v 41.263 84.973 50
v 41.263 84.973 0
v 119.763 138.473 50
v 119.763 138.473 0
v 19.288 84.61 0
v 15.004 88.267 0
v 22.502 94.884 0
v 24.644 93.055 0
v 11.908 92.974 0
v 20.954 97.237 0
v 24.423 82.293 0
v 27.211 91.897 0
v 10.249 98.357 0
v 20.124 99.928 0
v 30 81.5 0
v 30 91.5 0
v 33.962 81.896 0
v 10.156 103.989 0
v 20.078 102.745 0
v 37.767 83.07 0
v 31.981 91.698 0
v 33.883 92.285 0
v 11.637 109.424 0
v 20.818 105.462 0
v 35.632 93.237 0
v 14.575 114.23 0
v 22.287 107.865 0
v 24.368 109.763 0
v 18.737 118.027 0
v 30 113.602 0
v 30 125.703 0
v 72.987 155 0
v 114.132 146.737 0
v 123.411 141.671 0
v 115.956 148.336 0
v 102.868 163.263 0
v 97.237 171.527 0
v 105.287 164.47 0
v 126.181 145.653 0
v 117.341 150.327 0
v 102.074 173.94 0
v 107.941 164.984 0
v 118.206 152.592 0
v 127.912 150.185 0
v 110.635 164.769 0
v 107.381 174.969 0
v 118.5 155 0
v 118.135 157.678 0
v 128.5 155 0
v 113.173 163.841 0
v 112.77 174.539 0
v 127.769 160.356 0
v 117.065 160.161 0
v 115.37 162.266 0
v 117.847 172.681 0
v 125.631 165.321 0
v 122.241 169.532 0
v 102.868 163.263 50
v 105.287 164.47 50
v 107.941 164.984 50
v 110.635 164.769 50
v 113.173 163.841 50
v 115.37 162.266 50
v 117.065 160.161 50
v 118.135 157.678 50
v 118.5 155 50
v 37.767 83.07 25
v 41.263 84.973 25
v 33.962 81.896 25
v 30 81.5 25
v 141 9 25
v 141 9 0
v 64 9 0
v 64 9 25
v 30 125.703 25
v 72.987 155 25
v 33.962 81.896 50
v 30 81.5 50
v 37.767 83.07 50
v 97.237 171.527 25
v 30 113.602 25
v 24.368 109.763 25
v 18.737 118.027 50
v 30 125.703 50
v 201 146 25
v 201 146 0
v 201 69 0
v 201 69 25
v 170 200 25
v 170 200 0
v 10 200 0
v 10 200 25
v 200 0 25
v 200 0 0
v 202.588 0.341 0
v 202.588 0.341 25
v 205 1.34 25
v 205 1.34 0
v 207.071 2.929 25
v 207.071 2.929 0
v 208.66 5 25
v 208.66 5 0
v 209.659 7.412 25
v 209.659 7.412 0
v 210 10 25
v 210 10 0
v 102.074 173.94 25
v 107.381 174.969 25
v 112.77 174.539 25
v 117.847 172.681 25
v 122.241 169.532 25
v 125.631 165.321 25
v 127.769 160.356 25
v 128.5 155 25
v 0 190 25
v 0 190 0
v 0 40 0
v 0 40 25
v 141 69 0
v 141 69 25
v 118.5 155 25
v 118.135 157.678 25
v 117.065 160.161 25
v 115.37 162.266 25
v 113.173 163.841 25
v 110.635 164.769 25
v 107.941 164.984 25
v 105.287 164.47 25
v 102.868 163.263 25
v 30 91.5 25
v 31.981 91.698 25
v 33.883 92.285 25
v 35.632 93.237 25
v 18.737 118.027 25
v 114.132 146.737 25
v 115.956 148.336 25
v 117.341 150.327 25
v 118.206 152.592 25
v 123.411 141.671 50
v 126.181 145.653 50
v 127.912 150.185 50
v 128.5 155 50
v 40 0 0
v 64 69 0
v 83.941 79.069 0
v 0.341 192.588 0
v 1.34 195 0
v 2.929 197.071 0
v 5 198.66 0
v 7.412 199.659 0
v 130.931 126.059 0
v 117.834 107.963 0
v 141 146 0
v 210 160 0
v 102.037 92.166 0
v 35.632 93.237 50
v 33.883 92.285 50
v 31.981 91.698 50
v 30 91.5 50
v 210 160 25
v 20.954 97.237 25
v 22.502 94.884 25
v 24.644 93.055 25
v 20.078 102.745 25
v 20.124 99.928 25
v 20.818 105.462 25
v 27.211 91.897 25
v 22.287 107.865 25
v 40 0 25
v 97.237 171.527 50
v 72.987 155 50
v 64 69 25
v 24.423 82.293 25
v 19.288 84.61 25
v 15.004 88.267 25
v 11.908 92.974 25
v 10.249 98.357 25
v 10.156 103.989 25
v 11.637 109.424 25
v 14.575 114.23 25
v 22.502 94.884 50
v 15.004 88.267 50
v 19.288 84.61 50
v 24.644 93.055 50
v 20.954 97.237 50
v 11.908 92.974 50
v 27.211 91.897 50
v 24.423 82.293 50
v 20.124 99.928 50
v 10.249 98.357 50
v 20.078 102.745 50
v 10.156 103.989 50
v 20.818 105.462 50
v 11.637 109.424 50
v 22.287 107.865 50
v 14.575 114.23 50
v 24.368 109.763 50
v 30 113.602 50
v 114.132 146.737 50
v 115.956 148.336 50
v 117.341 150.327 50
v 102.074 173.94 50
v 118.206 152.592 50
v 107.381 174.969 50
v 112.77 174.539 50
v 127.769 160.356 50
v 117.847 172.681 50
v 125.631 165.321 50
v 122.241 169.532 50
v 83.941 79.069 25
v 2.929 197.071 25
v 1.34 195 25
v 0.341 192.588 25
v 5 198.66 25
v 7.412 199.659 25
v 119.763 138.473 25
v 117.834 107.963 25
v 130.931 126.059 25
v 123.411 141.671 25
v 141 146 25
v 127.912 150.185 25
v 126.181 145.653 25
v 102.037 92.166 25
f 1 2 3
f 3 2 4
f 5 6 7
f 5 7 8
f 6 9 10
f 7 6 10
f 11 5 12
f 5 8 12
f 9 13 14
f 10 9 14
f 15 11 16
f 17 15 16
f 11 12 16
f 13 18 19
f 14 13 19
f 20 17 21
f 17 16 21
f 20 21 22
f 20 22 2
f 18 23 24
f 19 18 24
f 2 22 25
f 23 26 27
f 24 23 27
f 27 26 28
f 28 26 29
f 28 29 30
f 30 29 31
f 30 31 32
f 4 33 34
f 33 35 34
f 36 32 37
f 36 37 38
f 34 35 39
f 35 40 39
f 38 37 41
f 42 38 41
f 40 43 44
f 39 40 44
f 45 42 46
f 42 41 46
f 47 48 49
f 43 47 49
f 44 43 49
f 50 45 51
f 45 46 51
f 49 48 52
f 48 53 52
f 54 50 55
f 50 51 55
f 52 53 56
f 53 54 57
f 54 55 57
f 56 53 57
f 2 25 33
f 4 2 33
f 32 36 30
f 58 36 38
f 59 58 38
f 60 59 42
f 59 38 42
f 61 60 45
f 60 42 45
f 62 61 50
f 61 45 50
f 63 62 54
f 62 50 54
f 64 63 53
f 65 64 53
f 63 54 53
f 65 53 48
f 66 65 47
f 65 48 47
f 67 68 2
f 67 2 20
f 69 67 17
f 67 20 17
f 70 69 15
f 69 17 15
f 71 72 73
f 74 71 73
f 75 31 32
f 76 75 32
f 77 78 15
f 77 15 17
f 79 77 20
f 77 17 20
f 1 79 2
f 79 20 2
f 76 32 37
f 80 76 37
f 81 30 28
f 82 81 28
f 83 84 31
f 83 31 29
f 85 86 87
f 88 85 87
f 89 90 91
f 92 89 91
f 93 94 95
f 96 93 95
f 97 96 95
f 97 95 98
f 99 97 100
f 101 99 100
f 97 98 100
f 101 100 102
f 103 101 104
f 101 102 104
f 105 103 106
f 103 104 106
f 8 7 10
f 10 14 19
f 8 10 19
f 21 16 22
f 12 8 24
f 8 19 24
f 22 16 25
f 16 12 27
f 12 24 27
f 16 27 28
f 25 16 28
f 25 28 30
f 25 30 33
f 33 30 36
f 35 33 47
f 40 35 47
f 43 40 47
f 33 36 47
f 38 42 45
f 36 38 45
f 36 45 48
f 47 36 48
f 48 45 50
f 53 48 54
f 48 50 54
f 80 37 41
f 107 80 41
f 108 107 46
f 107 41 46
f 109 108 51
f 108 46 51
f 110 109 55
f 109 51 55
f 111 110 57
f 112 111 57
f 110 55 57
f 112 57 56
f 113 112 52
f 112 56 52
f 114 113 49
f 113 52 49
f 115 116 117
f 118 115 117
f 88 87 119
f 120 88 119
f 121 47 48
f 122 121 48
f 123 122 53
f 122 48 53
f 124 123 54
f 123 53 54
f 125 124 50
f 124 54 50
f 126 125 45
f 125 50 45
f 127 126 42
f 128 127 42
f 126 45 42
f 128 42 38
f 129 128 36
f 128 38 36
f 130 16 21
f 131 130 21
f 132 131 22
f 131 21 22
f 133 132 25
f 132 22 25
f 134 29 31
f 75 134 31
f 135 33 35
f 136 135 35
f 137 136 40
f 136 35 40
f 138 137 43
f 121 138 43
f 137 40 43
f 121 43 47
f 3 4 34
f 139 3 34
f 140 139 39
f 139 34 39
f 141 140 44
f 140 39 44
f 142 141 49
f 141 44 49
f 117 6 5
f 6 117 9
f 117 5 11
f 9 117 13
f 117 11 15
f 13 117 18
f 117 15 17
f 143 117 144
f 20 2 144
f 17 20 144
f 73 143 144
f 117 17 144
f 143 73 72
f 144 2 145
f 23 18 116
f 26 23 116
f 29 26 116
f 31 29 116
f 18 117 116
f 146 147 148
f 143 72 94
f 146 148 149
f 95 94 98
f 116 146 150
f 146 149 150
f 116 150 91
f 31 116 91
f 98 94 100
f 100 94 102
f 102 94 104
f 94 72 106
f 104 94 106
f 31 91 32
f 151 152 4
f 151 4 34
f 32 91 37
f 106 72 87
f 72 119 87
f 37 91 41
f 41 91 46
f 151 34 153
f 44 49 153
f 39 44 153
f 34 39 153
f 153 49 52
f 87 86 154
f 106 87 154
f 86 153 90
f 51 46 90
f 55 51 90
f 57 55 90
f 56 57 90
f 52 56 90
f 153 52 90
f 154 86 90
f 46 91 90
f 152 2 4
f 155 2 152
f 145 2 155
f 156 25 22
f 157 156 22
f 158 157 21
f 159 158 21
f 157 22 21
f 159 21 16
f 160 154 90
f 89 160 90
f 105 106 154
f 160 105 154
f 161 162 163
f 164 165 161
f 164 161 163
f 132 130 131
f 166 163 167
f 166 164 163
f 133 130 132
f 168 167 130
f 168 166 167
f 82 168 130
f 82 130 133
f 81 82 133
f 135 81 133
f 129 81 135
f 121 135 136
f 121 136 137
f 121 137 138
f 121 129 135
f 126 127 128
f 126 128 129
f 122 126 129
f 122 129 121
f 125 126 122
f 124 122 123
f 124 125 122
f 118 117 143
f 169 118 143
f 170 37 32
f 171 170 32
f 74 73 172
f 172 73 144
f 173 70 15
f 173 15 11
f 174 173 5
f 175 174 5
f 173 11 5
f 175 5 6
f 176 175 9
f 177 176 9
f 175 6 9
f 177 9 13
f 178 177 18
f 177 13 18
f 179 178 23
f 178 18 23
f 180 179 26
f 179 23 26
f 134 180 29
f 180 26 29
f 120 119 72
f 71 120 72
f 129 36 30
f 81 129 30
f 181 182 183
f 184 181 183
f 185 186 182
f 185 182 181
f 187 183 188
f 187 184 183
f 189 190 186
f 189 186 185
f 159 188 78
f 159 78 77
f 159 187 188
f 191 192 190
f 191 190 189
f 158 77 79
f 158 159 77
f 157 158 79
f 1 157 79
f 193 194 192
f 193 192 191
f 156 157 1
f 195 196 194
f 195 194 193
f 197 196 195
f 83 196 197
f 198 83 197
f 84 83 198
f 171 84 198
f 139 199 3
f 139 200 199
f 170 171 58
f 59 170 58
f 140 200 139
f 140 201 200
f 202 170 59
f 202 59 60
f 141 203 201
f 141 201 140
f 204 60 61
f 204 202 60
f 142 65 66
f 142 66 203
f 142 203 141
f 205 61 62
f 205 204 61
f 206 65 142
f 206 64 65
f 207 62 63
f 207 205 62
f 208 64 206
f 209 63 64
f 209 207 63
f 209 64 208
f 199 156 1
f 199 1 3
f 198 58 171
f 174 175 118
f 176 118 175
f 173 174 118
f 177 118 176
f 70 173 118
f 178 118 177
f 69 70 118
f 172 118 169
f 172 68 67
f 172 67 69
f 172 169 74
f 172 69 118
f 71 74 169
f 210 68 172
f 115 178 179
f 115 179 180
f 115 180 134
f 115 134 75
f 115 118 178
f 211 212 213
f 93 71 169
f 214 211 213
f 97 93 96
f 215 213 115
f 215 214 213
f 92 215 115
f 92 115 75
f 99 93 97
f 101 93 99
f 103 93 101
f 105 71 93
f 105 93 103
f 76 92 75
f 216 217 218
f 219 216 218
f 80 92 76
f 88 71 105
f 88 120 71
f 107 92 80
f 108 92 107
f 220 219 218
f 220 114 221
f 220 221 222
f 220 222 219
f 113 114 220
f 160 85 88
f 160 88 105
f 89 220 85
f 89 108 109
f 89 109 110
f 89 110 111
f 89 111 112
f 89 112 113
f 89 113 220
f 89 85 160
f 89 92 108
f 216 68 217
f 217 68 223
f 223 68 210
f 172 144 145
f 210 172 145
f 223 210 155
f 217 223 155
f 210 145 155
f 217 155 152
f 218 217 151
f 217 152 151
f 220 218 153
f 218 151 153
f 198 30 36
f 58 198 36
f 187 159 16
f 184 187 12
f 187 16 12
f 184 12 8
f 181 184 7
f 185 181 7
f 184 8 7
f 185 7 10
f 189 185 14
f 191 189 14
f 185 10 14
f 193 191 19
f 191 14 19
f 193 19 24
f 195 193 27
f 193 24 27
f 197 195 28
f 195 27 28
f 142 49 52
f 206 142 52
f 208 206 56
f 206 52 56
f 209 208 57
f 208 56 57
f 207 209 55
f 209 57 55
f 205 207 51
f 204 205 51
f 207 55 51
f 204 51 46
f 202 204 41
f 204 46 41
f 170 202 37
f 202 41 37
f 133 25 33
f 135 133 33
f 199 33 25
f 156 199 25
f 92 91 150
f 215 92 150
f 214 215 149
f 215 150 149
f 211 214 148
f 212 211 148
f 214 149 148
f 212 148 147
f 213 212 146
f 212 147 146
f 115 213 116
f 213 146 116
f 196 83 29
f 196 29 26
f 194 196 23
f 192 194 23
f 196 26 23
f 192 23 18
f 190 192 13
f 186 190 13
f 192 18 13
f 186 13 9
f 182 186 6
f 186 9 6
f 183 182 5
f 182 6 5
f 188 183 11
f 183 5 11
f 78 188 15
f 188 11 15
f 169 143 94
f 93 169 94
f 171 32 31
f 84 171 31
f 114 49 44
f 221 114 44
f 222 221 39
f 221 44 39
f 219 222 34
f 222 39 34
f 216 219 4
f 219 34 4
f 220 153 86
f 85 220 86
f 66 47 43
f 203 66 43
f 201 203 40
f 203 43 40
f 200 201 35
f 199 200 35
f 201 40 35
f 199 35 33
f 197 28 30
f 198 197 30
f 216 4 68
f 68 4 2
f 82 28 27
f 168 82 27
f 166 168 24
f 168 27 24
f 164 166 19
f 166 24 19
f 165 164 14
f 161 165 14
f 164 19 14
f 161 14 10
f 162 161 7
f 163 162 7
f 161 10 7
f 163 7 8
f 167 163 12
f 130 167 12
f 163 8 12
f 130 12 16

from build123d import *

# Parameters (mm, degrees)
F1_DEPTH = 25
F2_DEPTH = 25
F3_DEPTH = 50


with BuildPart() as f1:
    # F0 (on Top) → F1 (new body)
    with BuildSketch(Plane.XY):
        with BuildLine():
            Line((0, 40), (30, 10))
            Line((30, 10), (30, 81.5))
            ThreePointArc((30, 81.5), (10.8880211383, 95.6065914796), (18.7365300935, 118.0267736012))
            Line((18.7365300935, 118.0267736012), (30, 125.7031511808))
            Line((30, 125.7031511808), (30, 155))
            Line((30, 155), (72.9869650899, 155))
            Line((72.9869650899, 155), (97.2365300935, 171.5267736012))
            ThreePointArc((97.2365300935, 171.5267736012), (117.846940726, 172.6814789841), (128.5, 155))
            Line((128.5, 155), (210, 155))
            Line((210, 155), (210, 160))
            Line((210, 160), (170, 200))
            Line((170, 200), (10, 200))
            ThreePointArc((10, 200), (2.9289321881, 197.0710678119), (0, 190))
            Line((0, 190), (0, 40))
        make_face()
        with BuildLine():
            Line((30, 10), (40, 0))
            Line((40, 0), (57.8877478838, 0))
            Line((57.8877478838, 0), (141, 0))
            Line((141, 0), (141, 9))
            Line((141, 9), (64, 9))
            Line((64, 9), (64, 69))
            ThreePointArc((64, 69), (110.2494154358, 99.7505845642), (141, 146))
            Line((141, 146), (201, 146))
            Line((201, 146), (201, 89.5927730799))
            Line((201, 89.5927730799), (210, 89.5927730799))
            Line((210, 89.5927730799), (210, 109.1042194366))
            Line((210, 109.1042194366), (210, 155))
            Line((210, 155), (128.5, 155))
            ThreePointArc((128.5, 155), (126.1814789841, 145.653059274), (119.7634699065, 138.4732263988))
            Line((119.7634699065, 138.4732263988), (41.2634699065, 84.9732263988))
            ThreePointArc((41.2634699065, 84.9732263988), (35.8934085204, 82.3880211383), (30, 81.5))
            Line((30, 81.5), (30, 10))
        make_face()
        with BuildLine():
            Line((141, 9), (141, 0))
            Line((141, 0), (161.8052124977, 0))
            Line((161.8052124977, 0), (200, 0))
            ThreePointArc((200, 0), (207.0710678119, 2.9289321881), (210, 10))
            Line((210, 10), (210, 89.5927730799))
            Line((210, 89.5927730799), (201, 89.5927730799))
            Line((201, 89.5927730799), (201, 69))
            Line((201, 69), (141, 69))
            Line((141, 69), (141, 9))
        make_face()
        Polygon((30, 155), (30, 125.7031511808), (72.9869650899, 155), align=None)
    extrude(amount=F1_DEPTH)


with BuildPart() as f2:
    # F0 (on Top) → F2 (new body)
    with BuildSketch(Plane.XY):
        with BuildLine():
            Line((30, 113.6015755904), (30, 91.5))
            ThreePointArc((30, 91.5), (32.9467042602, 91.9440105691), (35.6317349533, 93.2366131994))
            Line((35.6317349533, 93.2366131994), (114.1317349533, 146.7366131994))
            ThreePointArc((114.1317349533, 146.7366131994), (117.3407394921, 150.326529637), (118.5, 155))
            Line((118.5, 155), (90.7434825449, 155))
            Line((90.7434825449, 155), (30, 113.6015755904))
        make_face()
        with BuildLine():
            ThreePointArc((24.3682650467, 109.7633868006), (20.4440105691, 98.5532957398), (30, 91.5))
            Line((30, 91.5), (30, 113.6015755904))
            Line((30, 113.6015755904), (24.3682650467, 109.7633868006))
        make_face()
        with BuildLine():
            Line((102.8682650467, 163.2633868006), (90.7434825449, 155))
            Line((90.7434825449, 155), (118.5, 155))
            ThreePointArc((118.5, 155), (113.173470363, 163.8407394921), (102.8682650467, 163.2633868006))
        make_face()
    extrude(amount=F2_DEPTH)


with BuildPart() as f3:
    # F0 (on Top) → F3 (new body)
    with BuildSketch(Plane.XY):
        with BuildLine():
            ThreePointArc((18.7365300935, 118.0267736012), (10.8880211383, 95.6065914796), (30, 81.5))
            Line((30, 81.5), (30, 91.5))
            ThreePointArc((30, 91.5), (20.4440105691, 98.5532957398), (24.3682650467, 109.7633868006))
            Line((24.3682650467, 109.7633868006), (30, 113.6015755904))
            Line((30, 113.6015755904), (30, 125.7031511808))
            Line((30, 125.7031511808), (18.7365300935, 118.0267736012))
        make_face()
        with BuildLine():
            Line((30, 91.5), (30, 81.5))
            ThreePointArc((30, 81.5), (35.8934085204, 82.3880211383), (41.2634699065, 84.9732263988))
            Line((41.2634699065, 84.9732263988), (119.7634699065, 138.4732263988))
            ThreePointArc((119.7634699065, 138.4732263988), (126.1814789841, 145.653059274), (128.5, 155))
            Line((128.5, 155), (118.5, 155))
            ThreePointArc((118.5, 155), (117.3407394921, 150.326529637), (114.1317349533, 146.7366131994))
            Line((114.1317349533, 146.7366131994), (35.6317349533, 93.2366131994))
            ThreePointArc((35.6317349533, 93.2366131994), (32.9467042602, 91.9440105691), (30, 91.5))
        make_face()
        with BuildLine():
            Line((72.9869650899, 155), (90.7434825449, 155))
            Line((90.7434825449, 155), (102.8682650467, 163.2633868006))
            ThreePointArc((102.8682650467, 163.2633868006), (113.173470363, 163.8407394921), (118.5, 155))
            Line((118.5, 155), (128.5, 155))
            ThreePointArc((128.5, 155), (117.846940726, 172.6814789841), (97.2365300935, 171.5267736012))
            Line((97.2365300935, 171.5267736012), (72.9869650899, 155))
        make_face()
        Polygon((30, 125.7031511808), (30, 113.6015755904), (90.7434825449, 155), (72.9869650899, 155), align=None)
    extrude(amount=F3_DEPTH)


solid = Compound([f1.part, f2.part, f3.part])
